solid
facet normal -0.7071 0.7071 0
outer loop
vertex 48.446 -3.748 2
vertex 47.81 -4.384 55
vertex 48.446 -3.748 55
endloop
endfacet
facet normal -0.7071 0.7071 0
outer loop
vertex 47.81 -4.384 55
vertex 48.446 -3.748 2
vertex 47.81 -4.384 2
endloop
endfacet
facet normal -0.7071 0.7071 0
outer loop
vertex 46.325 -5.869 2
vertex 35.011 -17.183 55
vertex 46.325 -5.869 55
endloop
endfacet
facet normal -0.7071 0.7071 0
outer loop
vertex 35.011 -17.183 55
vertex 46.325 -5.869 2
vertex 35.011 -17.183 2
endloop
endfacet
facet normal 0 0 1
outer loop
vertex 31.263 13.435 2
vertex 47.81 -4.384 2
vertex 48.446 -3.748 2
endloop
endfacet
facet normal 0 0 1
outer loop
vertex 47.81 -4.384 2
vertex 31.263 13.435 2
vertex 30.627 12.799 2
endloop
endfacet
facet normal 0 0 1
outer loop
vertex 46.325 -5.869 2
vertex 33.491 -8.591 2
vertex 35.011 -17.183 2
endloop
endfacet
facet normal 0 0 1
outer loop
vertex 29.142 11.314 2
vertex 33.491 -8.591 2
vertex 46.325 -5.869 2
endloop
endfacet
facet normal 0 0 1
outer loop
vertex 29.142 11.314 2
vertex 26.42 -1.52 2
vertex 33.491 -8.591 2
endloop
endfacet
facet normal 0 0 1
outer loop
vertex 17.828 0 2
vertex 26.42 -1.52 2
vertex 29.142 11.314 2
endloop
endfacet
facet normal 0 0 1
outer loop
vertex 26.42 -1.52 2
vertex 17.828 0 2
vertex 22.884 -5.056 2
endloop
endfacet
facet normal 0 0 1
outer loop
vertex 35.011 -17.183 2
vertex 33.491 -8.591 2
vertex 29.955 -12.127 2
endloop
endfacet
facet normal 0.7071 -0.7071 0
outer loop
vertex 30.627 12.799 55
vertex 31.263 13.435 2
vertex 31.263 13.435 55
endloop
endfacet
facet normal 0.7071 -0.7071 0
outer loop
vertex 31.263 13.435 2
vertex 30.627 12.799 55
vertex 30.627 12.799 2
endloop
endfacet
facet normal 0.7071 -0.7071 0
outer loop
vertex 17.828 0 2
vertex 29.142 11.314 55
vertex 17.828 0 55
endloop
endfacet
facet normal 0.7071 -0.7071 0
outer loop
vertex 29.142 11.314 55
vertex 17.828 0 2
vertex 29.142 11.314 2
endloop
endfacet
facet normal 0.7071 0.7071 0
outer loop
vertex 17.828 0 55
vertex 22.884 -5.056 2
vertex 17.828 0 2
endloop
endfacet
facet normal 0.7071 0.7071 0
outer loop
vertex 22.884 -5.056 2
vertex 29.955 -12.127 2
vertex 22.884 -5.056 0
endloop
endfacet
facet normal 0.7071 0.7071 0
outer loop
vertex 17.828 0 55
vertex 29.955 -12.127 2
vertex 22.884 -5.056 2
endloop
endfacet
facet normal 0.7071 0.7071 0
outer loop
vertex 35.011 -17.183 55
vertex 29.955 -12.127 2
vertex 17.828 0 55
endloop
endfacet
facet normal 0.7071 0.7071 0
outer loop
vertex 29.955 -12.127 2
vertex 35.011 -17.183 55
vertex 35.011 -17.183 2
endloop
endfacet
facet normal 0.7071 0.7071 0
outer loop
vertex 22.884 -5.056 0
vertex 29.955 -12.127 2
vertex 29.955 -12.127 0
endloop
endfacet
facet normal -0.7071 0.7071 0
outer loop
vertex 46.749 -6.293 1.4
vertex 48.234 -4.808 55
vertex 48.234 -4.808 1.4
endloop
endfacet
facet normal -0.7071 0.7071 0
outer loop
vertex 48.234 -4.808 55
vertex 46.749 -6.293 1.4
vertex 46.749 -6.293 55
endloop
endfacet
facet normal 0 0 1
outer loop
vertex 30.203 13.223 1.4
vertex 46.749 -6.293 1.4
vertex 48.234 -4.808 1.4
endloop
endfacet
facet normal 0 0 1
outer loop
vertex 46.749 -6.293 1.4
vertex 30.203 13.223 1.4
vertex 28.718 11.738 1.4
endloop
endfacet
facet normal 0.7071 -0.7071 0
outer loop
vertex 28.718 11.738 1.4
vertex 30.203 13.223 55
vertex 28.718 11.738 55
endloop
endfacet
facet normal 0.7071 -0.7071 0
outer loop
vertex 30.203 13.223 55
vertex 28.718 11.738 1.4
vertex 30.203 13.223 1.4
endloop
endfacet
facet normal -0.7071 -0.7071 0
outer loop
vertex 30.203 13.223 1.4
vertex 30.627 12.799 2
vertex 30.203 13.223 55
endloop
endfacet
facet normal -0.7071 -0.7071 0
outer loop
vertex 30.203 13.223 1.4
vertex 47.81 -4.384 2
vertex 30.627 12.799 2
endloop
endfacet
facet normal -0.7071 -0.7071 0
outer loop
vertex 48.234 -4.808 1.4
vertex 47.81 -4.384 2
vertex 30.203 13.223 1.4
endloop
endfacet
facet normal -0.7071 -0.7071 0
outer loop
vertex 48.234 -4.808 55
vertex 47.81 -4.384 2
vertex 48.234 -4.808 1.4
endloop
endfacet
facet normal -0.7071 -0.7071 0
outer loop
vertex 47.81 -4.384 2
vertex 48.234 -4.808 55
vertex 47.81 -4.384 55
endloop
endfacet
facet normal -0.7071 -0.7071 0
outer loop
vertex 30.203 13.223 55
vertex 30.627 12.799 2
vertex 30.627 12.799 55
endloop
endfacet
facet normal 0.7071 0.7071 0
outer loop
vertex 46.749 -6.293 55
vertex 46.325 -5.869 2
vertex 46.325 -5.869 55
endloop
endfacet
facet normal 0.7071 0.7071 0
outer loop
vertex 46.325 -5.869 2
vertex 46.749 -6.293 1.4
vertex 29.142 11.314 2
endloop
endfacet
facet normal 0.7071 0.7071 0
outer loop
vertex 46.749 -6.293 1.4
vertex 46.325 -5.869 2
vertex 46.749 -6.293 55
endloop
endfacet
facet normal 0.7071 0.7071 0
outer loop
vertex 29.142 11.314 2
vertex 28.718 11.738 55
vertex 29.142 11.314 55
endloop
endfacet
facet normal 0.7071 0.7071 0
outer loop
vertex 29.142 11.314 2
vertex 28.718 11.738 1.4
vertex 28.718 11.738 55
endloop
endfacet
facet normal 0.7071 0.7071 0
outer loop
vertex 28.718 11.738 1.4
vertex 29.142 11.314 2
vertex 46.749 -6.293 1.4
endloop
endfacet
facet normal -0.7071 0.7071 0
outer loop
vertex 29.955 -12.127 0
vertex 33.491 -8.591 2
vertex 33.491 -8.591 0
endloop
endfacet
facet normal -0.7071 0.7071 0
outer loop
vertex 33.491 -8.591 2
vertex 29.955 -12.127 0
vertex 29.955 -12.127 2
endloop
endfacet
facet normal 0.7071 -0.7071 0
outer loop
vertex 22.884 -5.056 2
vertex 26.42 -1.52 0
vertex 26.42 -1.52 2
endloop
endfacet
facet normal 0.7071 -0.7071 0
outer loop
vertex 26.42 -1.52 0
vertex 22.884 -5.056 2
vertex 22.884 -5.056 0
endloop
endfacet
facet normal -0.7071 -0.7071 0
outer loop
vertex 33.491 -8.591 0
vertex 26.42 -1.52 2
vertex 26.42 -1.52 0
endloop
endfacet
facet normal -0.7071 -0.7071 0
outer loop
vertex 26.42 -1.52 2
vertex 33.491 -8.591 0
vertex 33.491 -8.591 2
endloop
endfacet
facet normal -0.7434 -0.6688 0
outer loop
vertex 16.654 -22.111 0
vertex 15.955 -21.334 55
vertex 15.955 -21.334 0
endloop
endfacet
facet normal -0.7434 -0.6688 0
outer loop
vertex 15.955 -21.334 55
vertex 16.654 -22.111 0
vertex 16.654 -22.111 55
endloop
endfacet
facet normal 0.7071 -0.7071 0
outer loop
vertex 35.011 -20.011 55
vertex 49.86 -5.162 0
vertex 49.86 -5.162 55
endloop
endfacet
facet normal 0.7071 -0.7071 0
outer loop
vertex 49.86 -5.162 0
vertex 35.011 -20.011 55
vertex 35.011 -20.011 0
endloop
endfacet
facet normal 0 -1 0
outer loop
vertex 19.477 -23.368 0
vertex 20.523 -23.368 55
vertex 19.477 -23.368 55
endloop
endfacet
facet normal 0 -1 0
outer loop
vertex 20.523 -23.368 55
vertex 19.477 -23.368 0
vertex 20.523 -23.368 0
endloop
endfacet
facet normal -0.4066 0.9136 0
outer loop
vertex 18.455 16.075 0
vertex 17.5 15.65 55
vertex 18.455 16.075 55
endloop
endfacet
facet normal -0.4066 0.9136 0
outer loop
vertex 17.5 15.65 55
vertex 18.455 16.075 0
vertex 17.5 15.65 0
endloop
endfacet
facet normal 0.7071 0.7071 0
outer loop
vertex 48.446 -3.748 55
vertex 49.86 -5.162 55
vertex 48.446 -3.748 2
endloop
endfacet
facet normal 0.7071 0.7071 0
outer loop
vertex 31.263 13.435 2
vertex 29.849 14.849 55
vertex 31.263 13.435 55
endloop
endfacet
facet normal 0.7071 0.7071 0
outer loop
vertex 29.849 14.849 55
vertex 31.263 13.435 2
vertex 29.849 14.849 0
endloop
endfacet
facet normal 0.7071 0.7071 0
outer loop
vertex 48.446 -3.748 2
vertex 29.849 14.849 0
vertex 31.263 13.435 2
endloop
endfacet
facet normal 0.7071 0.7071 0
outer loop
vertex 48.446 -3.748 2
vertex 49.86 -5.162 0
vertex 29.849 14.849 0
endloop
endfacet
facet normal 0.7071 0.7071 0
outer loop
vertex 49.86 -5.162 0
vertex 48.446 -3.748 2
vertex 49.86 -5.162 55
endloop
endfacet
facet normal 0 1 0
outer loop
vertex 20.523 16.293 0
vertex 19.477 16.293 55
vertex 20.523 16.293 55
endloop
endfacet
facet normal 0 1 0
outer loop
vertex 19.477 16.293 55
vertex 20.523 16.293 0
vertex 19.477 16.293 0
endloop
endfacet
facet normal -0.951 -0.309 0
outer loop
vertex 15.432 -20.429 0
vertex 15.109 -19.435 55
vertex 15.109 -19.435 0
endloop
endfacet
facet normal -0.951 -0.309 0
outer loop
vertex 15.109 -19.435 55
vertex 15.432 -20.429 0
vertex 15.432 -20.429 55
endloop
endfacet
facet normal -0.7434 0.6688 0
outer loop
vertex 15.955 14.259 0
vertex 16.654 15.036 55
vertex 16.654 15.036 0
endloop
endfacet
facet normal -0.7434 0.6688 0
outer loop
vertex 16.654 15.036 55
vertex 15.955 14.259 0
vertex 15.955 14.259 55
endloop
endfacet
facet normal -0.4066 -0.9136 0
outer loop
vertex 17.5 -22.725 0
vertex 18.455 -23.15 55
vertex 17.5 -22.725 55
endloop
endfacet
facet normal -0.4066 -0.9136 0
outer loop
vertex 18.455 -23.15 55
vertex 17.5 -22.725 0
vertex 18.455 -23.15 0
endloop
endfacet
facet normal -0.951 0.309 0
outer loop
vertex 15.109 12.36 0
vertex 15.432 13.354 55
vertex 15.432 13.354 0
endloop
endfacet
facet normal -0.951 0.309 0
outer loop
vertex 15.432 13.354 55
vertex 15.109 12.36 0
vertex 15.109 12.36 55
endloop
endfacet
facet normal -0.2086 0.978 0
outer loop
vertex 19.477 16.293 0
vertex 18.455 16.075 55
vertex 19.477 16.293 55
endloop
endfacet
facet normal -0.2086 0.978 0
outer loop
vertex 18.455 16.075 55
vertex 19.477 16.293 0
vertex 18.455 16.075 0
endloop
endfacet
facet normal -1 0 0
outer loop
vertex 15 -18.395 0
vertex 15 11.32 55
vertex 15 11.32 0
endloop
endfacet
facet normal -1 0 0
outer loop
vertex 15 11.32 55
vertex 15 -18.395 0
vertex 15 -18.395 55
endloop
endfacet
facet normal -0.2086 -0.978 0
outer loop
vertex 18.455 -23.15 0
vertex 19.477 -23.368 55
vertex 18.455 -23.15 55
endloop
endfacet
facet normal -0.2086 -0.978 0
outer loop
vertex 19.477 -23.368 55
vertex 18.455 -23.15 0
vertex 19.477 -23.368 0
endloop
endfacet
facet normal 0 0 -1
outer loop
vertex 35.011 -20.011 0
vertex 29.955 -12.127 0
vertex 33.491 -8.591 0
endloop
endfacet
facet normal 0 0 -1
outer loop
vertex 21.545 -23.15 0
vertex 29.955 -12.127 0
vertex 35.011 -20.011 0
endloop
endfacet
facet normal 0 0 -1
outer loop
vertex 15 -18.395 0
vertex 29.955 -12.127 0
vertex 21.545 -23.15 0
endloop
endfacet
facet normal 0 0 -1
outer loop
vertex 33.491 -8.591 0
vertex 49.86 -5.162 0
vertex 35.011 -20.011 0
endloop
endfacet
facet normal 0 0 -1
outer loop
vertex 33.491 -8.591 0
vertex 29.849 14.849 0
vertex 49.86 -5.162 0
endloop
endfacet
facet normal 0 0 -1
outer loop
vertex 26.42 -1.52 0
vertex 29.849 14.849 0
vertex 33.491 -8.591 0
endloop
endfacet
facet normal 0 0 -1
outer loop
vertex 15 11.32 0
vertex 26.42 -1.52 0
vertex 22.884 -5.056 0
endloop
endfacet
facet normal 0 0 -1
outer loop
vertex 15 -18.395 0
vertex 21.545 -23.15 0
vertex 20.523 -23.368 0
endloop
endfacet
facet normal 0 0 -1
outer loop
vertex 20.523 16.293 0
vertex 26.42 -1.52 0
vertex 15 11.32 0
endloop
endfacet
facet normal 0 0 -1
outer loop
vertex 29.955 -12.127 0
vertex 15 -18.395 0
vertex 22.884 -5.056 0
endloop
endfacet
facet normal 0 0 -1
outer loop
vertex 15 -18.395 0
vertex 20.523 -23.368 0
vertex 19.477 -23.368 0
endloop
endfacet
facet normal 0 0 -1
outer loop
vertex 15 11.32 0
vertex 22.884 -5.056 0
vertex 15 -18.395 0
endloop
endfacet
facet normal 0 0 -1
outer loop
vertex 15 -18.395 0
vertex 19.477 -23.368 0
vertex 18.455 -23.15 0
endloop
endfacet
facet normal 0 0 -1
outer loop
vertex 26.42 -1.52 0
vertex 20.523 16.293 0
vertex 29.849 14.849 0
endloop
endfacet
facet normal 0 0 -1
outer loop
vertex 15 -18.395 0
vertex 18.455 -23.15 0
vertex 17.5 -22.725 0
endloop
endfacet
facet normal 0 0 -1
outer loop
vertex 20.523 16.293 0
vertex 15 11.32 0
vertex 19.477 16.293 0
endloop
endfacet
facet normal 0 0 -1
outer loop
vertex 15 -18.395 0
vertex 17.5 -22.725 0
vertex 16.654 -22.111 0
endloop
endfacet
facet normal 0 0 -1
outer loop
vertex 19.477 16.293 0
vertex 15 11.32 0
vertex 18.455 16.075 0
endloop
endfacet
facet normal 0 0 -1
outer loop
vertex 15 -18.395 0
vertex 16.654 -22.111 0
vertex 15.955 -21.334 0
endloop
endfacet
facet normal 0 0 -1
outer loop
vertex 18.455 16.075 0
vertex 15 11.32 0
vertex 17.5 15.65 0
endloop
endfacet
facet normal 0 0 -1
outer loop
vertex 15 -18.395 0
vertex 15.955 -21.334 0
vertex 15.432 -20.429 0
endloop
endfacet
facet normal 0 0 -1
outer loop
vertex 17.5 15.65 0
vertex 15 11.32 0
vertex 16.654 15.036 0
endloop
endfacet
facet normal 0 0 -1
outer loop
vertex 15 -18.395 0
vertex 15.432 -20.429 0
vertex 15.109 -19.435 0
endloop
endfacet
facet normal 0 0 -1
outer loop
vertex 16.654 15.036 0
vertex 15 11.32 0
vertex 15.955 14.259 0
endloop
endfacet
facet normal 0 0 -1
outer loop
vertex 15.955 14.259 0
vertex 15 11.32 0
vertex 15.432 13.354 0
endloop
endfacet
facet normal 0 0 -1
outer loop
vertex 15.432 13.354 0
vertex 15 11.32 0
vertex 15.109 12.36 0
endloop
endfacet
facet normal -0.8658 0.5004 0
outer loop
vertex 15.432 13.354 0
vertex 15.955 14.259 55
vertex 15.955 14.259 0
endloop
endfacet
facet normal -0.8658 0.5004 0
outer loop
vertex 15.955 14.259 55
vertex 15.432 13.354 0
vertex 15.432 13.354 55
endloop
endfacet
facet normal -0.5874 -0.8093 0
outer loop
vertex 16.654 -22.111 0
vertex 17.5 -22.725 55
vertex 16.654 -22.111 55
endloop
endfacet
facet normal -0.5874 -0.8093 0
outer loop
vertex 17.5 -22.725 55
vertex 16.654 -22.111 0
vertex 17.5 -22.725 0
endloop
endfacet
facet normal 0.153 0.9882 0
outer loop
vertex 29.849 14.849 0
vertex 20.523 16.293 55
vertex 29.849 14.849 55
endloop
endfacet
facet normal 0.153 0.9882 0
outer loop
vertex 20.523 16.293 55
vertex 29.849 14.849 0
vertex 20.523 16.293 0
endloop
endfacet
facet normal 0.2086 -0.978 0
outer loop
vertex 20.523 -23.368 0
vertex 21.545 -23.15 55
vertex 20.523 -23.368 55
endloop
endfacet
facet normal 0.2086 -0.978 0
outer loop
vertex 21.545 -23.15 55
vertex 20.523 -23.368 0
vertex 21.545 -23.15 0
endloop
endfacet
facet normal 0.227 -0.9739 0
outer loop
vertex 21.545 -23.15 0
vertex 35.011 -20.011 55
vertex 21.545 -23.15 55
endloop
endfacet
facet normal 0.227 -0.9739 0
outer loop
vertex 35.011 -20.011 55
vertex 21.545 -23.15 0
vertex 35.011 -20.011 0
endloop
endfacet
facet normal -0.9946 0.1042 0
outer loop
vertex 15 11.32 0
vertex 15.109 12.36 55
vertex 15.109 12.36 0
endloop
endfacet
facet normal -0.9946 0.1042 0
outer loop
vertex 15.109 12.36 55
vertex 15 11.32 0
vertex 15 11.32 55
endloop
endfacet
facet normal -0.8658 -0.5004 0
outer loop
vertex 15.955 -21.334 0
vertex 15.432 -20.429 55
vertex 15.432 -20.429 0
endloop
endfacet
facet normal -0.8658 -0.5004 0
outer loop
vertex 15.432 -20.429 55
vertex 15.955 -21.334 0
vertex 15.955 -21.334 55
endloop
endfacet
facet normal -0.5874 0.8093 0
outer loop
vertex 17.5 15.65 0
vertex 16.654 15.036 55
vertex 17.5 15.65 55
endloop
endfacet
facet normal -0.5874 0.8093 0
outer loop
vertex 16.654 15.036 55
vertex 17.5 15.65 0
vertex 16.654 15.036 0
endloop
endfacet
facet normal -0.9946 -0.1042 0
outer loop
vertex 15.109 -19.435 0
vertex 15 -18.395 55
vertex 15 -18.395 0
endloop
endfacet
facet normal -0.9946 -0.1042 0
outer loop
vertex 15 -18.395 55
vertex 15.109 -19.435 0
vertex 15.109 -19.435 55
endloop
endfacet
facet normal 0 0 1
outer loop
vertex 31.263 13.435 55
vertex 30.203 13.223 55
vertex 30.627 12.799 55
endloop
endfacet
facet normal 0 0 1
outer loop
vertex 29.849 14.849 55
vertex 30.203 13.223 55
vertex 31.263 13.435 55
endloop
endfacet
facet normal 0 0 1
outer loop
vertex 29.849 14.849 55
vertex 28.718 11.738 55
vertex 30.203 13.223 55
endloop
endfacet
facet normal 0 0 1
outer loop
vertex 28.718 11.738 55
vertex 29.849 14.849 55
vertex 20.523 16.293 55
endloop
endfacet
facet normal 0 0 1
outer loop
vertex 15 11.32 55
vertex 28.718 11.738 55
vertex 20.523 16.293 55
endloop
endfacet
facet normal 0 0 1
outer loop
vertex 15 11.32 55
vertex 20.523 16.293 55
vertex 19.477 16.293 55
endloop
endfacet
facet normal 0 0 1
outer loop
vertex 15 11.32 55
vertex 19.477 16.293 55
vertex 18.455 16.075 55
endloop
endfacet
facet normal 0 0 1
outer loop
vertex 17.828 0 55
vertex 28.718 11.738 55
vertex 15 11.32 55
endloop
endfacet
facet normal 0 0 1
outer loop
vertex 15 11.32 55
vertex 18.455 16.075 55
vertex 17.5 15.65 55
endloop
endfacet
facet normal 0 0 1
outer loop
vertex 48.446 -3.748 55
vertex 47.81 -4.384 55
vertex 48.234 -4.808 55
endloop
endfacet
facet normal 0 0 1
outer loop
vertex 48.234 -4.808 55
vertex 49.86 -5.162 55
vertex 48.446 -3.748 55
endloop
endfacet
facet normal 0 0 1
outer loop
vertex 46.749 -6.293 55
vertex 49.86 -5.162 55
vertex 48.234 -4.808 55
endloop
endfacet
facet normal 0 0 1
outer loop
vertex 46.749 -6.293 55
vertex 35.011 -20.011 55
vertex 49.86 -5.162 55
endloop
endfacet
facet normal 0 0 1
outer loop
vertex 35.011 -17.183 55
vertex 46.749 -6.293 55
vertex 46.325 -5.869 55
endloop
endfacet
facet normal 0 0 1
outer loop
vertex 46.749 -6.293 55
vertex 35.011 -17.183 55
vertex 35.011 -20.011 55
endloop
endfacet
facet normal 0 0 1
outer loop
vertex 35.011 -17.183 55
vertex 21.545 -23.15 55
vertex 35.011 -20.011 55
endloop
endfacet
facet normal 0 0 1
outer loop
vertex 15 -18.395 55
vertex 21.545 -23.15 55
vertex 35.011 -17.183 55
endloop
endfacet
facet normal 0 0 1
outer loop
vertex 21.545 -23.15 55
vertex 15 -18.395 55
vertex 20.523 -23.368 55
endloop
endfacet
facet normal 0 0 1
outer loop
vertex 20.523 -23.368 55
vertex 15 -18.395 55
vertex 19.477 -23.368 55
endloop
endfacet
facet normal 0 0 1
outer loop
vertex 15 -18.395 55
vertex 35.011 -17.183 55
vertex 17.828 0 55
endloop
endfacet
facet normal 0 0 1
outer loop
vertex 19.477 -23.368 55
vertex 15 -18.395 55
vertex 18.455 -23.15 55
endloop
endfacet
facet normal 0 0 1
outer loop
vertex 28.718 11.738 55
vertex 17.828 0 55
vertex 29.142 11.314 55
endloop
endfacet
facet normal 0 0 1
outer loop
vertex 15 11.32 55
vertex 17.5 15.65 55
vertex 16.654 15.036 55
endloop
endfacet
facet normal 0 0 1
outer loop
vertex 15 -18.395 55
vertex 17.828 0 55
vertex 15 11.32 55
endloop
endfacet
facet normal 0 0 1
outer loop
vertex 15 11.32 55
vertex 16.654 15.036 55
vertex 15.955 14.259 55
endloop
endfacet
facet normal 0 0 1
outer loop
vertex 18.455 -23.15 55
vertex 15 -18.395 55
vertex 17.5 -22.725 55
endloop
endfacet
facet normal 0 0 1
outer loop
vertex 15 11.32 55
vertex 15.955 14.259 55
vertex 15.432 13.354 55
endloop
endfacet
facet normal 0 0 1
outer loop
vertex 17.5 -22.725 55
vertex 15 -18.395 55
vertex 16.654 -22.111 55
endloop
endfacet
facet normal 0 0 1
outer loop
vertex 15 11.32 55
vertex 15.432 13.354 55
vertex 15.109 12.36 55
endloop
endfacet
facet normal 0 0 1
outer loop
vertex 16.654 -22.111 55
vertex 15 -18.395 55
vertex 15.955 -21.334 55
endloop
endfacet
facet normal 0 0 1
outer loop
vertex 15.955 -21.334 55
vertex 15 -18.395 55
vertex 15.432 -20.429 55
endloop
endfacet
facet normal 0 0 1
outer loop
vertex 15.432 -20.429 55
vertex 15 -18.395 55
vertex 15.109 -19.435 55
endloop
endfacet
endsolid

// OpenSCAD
// base is 28mm x 17mm


board_w=25.5;
board_l=53;
board_t=2.1;
pack_d=17;
wall_w=2;
notch_depth=0.6;
cavity_w=board_w-notch_depth*2;
base_w=cavity_w+wall_w*2;
base_d=pack_d+wall_w*2;
usb_conn_depth=17;

module outer_case() {
    cube([base_w,base_d,wall_w+board_l]);
}

module wall_lid() {
    cube([base_w,base_d,wall_w]);
}

module inner_case()
{
    translate([wall_w,wall_w,wall_w])cube([cavity_w,pack_d+4,board_l+1]);
    #translate([wall_w-(board_w-cavity_w)/2,pack_d+wall_w-1,wall_w-notch_depth])cube([board_w,board_t,board_l+5]);
    #translate([wall_w+(cavity_w)/2,wall_w+2.5+pack_d-usb_conn_depth,-1])cube([10,5,10],center=true);
}

module angle_stand() {
    $fs=1;
    round_rad=5;
    tilt_angle=45;
    difference() {
        hull(){
            rotate([0,0,-tilt_angle])
            outer_case();
            translate([round_rad,-base_w*0.65])cylinder(wall_w+board_l,r=round_rad);
            translate([round_rad,base_w*0.4])cylinder(wall_w+board_l,r=round_rad);
        }
        rotate([0,0,-tilt_angle])
        inner_case();
    }
}

module wall_stand() {
    difference() {
        hull(){
            outer_case();
        }
        inner_case();
    }
}

translate([15,0,0])angle_stand();

//translate([15,15,0])rotate([0,0,-90])wall_lid();
//translate([13,-15,0])rotate([0,0,90])wall_stand();
